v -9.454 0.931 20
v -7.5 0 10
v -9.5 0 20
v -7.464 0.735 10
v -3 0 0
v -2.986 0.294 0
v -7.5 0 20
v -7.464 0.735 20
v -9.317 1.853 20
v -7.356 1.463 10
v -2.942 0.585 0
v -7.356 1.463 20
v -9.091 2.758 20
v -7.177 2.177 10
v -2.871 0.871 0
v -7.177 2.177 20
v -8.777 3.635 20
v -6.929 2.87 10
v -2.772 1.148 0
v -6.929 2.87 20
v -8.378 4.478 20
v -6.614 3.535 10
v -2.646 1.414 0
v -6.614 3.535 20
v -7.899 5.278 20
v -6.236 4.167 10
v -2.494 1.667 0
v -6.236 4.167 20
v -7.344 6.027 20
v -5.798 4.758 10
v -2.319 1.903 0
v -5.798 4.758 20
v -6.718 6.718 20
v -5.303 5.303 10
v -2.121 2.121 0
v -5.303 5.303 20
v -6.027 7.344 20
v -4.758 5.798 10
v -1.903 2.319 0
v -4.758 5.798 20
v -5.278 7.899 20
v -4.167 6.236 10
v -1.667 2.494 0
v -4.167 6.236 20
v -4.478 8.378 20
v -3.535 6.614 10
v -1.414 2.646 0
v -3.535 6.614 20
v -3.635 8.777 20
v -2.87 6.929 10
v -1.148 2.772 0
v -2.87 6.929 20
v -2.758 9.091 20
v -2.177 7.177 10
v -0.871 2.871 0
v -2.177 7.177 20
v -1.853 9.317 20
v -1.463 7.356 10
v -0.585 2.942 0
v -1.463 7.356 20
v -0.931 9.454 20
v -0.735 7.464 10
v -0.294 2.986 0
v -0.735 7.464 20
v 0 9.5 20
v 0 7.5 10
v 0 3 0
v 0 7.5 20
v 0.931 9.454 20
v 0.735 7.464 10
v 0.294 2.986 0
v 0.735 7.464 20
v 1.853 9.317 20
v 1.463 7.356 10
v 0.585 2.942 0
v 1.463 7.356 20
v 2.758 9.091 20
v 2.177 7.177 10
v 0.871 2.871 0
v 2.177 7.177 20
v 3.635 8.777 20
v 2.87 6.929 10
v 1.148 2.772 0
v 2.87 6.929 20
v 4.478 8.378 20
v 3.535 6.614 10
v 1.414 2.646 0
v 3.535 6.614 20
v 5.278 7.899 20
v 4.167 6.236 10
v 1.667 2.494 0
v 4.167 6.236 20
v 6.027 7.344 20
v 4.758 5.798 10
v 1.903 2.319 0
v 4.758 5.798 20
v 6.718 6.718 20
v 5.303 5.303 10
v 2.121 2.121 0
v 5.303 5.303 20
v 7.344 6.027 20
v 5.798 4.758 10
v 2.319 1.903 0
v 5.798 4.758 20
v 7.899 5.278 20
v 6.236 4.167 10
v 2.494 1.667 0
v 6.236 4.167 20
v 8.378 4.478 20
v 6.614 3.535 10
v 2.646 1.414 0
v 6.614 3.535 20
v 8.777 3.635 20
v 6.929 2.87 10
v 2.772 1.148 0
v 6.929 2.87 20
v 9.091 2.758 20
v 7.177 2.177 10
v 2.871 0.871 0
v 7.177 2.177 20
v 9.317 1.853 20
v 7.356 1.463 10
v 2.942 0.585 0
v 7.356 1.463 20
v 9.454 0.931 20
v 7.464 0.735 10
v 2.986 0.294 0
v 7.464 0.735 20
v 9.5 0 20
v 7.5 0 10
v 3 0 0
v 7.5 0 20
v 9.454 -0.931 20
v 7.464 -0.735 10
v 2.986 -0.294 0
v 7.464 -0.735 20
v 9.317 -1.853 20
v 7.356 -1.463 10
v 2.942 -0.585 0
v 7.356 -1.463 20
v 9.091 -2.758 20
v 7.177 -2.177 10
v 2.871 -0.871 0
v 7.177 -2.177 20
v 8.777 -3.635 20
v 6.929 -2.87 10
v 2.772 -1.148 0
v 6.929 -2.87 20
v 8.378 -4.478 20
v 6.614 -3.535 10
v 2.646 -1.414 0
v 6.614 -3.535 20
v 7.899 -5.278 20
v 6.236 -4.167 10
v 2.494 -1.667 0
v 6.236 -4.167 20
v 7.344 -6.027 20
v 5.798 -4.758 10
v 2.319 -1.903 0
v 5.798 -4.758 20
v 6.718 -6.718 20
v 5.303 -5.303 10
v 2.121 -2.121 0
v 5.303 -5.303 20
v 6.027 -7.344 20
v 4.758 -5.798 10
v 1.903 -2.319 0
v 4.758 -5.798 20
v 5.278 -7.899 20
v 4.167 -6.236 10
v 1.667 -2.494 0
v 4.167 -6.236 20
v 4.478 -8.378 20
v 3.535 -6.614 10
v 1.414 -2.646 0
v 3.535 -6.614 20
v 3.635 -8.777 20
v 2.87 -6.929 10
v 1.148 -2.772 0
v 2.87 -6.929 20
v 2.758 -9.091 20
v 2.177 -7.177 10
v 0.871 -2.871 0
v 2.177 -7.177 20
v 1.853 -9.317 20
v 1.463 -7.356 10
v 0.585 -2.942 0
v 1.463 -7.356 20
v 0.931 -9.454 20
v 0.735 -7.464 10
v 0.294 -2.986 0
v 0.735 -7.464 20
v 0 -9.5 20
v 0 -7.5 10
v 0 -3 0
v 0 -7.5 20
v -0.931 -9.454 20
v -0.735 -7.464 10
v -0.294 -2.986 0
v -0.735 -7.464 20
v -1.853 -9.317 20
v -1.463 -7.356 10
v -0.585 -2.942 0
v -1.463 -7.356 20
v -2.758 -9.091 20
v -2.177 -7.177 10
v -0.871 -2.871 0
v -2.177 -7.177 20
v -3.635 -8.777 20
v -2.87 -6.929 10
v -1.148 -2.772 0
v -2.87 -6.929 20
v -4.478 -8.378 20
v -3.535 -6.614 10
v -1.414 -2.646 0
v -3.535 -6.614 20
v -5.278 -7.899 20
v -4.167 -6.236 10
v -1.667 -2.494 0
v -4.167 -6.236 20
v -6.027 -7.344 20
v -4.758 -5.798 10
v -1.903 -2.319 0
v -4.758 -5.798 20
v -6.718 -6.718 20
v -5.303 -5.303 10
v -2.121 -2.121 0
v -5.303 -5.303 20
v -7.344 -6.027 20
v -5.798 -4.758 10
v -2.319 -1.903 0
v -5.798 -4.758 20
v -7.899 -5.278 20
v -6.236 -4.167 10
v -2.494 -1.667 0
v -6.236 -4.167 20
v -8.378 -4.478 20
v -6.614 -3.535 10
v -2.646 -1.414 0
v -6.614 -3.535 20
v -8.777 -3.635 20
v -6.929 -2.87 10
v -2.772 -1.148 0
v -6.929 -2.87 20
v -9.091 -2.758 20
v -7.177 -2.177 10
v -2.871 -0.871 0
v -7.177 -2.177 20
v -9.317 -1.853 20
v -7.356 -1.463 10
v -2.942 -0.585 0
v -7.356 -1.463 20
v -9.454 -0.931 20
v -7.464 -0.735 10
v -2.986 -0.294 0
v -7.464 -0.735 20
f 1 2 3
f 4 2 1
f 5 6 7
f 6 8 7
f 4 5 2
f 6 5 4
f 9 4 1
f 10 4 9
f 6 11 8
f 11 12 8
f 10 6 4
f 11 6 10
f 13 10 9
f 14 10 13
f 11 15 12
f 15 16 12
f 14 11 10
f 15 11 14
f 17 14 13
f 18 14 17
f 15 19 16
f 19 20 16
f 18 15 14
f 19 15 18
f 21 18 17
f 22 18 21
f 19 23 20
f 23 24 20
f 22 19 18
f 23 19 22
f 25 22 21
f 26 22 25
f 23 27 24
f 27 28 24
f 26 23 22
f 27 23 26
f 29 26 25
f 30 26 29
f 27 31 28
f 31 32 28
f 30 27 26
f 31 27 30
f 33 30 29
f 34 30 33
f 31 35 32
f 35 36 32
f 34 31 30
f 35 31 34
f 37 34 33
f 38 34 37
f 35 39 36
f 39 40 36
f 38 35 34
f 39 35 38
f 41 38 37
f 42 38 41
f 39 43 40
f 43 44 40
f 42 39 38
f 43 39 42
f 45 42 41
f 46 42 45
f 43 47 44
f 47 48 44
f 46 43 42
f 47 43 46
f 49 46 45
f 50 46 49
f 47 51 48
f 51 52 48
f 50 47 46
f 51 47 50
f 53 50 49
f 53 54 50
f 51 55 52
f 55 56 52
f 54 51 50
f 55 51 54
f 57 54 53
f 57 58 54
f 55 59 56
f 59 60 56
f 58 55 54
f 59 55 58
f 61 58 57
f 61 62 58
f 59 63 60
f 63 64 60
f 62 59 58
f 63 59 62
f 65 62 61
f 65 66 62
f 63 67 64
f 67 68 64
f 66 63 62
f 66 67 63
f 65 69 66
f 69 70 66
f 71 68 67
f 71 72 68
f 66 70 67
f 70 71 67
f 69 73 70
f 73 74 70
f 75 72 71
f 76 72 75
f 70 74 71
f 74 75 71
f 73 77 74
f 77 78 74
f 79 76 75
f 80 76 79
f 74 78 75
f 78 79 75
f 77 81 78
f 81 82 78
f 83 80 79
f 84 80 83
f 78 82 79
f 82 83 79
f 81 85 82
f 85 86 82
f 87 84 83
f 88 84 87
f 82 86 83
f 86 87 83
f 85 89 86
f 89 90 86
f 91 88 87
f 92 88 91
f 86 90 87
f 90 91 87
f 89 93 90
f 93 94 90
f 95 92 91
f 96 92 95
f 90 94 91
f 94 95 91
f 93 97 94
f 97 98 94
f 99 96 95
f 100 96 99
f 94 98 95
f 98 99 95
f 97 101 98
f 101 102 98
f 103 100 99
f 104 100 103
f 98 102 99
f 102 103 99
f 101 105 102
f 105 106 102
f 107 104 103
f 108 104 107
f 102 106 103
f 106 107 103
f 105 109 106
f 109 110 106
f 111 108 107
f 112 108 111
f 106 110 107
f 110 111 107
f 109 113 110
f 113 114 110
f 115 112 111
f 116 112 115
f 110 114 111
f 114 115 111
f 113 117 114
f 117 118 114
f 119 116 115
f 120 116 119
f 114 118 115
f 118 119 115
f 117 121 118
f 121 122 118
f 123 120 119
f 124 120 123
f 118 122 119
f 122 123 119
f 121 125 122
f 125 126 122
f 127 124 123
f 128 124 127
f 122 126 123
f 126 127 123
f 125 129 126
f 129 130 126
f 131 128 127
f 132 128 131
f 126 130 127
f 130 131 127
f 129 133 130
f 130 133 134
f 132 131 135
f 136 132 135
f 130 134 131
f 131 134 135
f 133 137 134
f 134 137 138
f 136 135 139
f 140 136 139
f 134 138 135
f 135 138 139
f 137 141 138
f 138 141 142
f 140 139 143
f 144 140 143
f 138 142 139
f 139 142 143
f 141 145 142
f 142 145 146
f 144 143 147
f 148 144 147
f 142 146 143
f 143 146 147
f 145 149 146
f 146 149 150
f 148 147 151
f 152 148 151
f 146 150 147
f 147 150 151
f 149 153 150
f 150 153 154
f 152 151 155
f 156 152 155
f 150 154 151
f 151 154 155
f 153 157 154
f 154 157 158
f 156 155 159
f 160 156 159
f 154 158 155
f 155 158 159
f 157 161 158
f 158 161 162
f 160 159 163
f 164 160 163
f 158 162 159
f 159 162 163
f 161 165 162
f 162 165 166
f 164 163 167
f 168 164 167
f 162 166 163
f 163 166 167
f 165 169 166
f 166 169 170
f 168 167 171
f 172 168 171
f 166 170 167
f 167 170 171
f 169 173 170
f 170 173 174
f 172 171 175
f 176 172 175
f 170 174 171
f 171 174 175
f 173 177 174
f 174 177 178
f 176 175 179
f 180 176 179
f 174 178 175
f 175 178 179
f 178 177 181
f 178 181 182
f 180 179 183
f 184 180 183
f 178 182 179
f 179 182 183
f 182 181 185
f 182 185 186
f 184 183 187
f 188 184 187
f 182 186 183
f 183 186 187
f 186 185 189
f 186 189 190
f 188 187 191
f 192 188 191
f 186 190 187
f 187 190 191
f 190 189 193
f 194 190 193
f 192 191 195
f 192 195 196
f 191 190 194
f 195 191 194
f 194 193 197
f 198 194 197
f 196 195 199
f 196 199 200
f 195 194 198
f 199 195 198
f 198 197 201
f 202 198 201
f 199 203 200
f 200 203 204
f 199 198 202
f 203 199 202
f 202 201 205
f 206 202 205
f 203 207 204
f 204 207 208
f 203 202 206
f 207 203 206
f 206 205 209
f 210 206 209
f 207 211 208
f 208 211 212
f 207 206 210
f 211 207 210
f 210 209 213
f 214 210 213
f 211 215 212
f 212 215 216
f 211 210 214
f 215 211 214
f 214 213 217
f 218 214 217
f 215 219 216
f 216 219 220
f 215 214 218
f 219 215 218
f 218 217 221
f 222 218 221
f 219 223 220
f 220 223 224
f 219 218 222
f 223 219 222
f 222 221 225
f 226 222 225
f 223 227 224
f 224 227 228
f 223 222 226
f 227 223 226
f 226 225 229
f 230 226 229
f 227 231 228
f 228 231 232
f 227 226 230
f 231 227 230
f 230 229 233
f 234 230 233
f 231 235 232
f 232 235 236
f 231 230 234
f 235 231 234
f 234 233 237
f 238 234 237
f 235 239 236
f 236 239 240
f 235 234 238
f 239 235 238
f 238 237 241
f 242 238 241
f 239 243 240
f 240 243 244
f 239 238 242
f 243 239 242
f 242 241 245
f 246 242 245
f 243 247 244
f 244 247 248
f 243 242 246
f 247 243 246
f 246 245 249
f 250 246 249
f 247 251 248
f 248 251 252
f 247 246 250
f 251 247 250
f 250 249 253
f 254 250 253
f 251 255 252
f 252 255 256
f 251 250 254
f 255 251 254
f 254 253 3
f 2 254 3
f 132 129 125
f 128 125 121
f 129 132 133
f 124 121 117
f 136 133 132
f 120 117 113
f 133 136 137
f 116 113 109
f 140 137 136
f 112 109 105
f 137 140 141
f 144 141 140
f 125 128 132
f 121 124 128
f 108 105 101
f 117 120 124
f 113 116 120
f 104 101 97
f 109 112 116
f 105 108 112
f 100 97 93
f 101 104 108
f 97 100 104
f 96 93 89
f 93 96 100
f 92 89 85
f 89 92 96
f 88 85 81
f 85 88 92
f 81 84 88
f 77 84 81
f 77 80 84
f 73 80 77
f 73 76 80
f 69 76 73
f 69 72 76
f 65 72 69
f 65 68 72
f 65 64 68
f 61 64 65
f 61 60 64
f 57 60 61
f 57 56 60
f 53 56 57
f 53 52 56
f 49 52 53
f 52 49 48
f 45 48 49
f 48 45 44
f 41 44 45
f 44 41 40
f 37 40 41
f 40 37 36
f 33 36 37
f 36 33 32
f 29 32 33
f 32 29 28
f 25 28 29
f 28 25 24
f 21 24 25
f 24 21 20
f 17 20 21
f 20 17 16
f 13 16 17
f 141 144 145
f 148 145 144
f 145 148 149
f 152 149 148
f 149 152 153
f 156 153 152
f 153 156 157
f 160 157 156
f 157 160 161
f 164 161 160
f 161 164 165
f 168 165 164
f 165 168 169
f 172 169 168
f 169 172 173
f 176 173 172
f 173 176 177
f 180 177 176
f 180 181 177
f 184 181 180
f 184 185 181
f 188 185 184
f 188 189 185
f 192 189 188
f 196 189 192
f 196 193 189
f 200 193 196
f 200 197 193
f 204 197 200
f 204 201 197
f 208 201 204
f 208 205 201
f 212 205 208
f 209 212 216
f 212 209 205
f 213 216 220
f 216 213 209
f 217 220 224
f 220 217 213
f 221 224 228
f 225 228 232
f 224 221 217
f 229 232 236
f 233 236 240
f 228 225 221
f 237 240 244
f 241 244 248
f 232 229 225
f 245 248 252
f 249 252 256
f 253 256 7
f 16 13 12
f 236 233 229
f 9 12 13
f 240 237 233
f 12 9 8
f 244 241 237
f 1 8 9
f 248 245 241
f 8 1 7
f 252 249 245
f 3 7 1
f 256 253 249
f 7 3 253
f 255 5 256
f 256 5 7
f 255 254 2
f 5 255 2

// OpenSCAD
// Built by bench/smallmodels/features/compiler.py from a list of features.
$fn = 64;
difference() {
  union() {
    translate([0, 0, 0]) rotate_extrude() polygon([[3, 0], [7.5, 20], [9.5, 20], [7.5, 10], [3, 0]]);
  }
  union() {
    translate([0, 0, -1]) rotate([0, 0, 0]) cylinder(d = 3, h = 22);
  }
}
